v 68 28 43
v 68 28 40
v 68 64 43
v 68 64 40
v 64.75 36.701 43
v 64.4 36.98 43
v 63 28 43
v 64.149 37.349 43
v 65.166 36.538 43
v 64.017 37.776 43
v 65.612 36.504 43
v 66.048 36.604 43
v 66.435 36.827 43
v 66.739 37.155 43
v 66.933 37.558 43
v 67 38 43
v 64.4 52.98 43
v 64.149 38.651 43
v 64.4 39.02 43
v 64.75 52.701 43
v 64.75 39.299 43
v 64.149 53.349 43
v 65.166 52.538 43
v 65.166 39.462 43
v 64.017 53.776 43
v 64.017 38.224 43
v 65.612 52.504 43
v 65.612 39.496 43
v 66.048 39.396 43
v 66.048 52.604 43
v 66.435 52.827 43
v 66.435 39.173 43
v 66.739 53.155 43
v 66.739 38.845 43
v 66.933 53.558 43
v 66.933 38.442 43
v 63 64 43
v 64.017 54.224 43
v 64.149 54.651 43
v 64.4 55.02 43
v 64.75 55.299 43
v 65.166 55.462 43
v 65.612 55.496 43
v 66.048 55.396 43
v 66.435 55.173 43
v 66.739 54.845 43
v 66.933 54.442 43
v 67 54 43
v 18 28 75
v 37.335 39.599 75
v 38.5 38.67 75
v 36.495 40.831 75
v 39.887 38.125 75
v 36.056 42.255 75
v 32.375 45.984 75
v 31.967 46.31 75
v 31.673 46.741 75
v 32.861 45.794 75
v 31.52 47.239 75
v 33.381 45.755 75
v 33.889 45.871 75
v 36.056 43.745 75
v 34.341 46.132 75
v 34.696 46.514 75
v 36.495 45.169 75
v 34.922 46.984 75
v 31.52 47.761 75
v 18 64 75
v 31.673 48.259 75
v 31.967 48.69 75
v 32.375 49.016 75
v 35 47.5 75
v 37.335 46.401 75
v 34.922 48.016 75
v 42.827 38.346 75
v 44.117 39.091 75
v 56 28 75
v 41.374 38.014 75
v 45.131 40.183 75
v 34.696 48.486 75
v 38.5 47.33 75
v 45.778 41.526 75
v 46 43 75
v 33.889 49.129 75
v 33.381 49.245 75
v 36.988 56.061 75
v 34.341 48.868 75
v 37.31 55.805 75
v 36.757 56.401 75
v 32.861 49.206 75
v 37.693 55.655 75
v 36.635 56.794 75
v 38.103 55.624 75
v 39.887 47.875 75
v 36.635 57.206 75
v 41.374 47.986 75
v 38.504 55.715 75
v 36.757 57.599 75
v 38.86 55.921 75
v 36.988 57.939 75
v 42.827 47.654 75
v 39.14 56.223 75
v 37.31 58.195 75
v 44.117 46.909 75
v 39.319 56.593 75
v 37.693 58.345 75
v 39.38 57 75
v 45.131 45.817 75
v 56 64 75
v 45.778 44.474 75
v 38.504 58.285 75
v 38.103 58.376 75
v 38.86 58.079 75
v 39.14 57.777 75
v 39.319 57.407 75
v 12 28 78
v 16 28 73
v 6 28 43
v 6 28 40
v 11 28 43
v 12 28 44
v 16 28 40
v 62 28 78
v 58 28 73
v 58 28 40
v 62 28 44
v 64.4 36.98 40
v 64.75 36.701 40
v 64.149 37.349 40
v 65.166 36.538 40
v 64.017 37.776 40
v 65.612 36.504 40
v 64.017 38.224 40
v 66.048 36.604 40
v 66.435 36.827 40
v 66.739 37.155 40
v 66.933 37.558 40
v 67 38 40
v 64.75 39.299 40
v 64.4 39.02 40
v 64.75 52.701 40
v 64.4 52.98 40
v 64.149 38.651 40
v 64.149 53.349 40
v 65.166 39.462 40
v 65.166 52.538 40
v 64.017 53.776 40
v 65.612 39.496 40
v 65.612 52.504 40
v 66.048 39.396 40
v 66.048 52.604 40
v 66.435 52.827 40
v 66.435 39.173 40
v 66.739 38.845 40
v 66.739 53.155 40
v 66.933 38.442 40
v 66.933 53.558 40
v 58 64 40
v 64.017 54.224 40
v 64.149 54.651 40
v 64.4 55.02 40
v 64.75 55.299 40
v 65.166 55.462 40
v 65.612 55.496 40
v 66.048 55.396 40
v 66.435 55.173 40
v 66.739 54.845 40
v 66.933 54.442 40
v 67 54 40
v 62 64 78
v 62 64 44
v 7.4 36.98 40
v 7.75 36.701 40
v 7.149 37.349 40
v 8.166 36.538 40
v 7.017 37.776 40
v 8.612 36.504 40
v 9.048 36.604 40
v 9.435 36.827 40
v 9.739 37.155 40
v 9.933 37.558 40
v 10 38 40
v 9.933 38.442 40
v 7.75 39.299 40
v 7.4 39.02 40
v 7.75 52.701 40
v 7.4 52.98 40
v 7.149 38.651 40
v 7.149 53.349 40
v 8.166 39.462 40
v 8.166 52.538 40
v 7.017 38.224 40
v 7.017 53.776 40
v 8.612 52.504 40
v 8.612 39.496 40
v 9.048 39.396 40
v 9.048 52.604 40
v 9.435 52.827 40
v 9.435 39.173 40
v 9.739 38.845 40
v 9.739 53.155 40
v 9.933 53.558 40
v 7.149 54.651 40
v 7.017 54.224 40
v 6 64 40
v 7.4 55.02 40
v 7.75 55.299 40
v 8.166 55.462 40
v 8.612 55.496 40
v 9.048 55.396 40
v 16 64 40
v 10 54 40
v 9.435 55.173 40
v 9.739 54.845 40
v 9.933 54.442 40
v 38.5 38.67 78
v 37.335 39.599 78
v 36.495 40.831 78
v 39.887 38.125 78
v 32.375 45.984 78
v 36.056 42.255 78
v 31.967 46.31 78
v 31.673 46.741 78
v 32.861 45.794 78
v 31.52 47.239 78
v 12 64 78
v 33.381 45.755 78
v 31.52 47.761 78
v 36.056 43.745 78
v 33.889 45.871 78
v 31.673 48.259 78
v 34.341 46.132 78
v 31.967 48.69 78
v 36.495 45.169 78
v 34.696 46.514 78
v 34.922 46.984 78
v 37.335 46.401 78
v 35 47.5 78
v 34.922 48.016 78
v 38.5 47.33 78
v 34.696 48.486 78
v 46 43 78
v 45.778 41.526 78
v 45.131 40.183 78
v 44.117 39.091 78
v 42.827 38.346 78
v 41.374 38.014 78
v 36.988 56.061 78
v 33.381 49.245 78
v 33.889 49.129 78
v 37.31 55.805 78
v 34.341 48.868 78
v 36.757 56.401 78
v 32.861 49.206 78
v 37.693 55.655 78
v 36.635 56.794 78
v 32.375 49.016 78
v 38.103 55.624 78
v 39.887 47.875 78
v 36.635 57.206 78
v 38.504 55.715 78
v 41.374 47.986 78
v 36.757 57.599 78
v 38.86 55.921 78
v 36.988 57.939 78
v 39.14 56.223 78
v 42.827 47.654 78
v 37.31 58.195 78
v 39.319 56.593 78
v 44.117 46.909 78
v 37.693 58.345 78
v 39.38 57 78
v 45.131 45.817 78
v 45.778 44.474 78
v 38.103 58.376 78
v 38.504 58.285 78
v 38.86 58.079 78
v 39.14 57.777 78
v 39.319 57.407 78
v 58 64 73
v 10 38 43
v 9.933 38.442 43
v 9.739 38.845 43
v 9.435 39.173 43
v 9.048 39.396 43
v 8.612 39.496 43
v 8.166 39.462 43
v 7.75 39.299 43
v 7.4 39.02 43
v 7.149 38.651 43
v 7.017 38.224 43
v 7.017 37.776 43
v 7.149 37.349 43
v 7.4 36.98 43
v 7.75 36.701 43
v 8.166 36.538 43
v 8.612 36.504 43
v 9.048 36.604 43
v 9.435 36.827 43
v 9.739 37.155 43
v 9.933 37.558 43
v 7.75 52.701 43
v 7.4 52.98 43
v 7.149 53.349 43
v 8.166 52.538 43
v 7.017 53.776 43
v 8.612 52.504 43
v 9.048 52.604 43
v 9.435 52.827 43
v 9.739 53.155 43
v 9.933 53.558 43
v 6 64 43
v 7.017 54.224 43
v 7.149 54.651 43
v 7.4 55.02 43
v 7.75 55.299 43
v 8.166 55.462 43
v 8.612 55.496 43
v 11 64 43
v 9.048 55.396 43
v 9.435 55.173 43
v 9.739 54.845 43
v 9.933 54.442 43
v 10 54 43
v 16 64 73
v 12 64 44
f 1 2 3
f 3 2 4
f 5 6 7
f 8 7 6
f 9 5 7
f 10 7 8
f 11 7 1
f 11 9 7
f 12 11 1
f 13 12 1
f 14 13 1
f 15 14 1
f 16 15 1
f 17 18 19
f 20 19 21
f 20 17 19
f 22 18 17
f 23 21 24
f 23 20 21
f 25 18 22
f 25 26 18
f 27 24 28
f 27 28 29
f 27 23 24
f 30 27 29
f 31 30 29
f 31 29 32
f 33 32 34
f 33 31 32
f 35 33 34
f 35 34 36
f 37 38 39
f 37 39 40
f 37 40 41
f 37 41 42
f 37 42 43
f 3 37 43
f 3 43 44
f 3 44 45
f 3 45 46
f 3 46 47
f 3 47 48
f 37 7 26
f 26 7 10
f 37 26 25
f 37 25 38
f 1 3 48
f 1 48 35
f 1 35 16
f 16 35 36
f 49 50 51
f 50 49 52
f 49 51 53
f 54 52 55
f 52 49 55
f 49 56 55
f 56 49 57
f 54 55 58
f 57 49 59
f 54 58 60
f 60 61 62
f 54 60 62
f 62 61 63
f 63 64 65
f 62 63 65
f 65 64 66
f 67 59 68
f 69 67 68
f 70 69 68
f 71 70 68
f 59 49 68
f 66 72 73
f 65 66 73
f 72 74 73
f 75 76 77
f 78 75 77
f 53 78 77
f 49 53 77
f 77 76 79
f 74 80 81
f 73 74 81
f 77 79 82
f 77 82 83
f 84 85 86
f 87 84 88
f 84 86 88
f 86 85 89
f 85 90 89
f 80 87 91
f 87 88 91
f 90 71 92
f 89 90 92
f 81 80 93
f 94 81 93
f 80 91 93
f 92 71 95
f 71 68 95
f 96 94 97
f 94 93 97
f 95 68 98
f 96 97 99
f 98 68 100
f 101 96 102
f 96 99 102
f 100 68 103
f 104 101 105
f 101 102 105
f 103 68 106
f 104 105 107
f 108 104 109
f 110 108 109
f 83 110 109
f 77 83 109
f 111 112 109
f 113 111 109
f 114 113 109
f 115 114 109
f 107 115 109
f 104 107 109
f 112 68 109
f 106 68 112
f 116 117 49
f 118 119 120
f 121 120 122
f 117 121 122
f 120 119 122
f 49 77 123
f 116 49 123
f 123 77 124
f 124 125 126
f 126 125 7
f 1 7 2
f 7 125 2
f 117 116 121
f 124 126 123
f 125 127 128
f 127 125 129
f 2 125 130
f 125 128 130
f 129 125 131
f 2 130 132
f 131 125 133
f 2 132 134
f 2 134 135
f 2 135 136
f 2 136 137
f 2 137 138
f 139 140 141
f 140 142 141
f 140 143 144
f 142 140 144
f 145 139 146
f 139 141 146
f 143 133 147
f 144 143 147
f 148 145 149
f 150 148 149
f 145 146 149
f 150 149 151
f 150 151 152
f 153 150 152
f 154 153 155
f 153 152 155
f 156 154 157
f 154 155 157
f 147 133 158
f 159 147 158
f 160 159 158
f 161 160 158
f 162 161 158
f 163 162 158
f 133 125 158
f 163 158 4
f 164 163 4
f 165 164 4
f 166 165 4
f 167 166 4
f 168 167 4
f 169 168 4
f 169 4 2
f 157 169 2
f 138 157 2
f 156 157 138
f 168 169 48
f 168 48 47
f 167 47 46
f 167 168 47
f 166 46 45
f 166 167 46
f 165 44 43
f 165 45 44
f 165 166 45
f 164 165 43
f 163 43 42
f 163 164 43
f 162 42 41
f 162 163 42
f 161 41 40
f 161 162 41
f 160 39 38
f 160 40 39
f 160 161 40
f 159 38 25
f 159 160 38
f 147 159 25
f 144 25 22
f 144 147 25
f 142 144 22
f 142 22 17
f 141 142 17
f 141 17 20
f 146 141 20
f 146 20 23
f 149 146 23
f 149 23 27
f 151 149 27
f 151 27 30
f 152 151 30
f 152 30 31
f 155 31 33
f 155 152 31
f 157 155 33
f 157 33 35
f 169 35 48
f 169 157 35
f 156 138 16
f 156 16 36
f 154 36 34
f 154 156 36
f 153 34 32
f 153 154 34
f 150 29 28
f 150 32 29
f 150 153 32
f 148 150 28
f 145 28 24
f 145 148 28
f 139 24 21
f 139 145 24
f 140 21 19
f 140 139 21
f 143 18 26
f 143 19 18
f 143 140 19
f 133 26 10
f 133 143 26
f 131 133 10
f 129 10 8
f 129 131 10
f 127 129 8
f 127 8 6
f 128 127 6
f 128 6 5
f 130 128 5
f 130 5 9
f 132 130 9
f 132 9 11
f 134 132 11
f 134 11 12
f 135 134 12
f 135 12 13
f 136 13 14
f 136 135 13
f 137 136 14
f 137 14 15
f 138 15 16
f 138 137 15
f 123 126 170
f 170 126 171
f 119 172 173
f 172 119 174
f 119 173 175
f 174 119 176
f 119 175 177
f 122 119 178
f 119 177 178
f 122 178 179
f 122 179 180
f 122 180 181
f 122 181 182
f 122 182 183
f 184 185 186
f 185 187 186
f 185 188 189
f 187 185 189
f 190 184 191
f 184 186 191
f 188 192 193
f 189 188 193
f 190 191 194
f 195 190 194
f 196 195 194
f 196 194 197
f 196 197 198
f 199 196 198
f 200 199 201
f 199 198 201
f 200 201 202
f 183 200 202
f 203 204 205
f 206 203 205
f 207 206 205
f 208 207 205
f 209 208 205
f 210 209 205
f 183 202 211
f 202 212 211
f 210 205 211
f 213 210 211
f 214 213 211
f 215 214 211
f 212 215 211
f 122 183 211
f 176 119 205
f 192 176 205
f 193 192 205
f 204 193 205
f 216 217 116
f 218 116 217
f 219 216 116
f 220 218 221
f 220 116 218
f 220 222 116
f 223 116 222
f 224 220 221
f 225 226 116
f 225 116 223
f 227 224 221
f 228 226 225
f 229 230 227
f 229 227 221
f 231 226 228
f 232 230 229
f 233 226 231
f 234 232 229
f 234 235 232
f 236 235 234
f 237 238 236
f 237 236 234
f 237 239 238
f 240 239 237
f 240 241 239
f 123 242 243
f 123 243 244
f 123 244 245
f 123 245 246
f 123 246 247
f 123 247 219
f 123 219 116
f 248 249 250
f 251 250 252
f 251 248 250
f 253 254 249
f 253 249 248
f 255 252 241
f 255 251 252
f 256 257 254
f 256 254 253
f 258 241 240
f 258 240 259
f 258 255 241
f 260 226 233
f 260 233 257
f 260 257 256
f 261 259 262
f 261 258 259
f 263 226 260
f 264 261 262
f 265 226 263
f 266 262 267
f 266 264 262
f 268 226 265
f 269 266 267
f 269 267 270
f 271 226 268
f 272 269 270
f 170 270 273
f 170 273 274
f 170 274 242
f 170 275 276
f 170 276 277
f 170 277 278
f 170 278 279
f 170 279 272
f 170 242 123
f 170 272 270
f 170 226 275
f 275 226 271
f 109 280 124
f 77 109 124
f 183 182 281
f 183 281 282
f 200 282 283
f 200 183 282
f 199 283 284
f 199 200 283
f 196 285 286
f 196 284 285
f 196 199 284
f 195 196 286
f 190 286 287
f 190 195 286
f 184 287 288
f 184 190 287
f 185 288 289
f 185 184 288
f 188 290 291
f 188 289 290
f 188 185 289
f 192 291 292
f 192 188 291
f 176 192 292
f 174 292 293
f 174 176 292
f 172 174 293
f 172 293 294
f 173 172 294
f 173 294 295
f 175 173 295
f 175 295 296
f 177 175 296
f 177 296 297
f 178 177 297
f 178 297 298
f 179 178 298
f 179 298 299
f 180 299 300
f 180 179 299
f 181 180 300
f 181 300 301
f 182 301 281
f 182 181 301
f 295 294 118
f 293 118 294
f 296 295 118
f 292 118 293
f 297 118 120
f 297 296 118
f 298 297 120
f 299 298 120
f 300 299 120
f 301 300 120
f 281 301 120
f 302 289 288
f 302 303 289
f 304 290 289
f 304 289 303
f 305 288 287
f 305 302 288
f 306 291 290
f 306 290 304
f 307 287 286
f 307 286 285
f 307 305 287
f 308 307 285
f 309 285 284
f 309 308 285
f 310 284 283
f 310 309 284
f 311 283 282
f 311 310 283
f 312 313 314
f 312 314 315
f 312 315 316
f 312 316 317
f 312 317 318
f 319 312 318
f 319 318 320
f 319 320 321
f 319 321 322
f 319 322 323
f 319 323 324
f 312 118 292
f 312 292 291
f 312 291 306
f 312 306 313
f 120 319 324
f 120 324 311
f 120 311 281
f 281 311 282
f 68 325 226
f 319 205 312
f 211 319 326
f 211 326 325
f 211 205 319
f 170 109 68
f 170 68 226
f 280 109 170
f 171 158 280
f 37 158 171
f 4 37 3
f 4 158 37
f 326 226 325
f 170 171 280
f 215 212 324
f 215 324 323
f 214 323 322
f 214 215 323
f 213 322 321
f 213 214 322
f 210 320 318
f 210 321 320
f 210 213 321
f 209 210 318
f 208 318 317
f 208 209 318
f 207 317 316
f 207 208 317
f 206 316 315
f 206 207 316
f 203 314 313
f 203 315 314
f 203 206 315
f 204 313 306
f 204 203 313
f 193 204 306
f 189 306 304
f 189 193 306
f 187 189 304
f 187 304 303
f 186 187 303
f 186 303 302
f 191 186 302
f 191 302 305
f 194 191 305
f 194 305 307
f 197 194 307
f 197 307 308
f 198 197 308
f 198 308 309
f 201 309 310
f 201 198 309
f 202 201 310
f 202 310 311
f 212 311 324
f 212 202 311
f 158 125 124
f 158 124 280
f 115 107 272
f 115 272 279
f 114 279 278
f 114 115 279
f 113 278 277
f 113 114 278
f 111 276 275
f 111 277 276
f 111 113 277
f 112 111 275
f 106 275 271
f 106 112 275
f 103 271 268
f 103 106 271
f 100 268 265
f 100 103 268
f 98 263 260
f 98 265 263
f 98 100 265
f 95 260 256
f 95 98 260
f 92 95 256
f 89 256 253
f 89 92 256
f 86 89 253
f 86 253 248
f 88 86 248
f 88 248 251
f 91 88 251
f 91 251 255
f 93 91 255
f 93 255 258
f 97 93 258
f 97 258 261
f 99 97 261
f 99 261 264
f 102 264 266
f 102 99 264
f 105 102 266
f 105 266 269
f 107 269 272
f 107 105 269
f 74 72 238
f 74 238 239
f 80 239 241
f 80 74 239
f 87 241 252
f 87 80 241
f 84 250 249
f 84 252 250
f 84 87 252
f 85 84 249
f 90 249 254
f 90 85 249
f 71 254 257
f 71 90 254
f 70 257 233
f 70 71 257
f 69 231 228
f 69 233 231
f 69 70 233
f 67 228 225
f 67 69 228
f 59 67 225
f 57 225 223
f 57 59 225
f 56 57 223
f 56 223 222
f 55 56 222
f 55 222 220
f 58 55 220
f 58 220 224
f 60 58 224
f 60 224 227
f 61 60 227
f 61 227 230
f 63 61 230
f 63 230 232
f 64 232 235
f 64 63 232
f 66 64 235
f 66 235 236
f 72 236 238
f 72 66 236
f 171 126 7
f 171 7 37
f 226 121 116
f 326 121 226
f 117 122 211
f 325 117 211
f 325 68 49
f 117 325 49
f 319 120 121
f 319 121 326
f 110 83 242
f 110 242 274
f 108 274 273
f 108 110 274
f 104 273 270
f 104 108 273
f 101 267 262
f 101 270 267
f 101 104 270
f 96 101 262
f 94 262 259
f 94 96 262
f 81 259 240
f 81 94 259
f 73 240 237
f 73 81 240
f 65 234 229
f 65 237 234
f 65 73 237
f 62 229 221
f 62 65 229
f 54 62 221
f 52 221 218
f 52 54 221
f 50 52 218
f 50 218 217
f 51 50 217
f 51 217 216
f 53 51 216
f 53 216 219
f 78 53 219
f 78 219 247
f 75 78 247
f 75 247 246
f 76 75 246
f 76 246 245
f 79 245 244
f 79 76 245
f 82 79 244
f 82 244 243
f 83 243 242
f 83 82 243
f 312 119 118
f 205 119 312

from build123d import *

# Parameters (mm, degrees)
CYLINDER049_R             = 1.38
CYLINDER049_DEPTH         = 40
CYLINDER030_R             = 1.75
CYLINDER030_DEPTH         = 10
CYLINDER029_R             = 5
CYLINDER029_DEPTH         = 10
CYLINDER024_R             = 8.5
CYLINDER024_DEPTH         = 2
BOX014_W                  = 0.5
BOX014_H                  = 1
BOX014_DEPTH              = 5
ARRAY002_COUNT            = 12
BOX015_W                  = 0.5
BOX015_H                  = 1
BOX015_DEPTH              = 5
CYLINDER026_R             = 4.5
CYLINDER026_DEPTH         = 8
CYLINDER028_R             = 1.5
CYLINDER028_DEPTH         = 4
BOX016_W                  = 1
BOX016_H                  = 10
BOX016_DEPTH              = 30
CYLINDER027_R             = 3
CYLINDER027_DEPTH         = 30
CYLINDER025_R             = 13
CYLINDER025_DEPTH         = 10
FUSION006_ROLL_ANGLE      = 180
FUSION006_PLACEMENT_ANGLE = 150
CYLINDER023_R             = 1.5
CYLINDER023_DEPTH         = 5
CYLINDER022_R             = 1.5
CYLINDER022_DEPTH         = 5
CYLINDER021_R             = 1.5
CYLINDER021_DEPTH         = 5
CYLINDER020_R             = 1.5
CYLINDER020_DEPTH         = 5
BOX010_W                  = 4
BOX010_H                  = 36
BOX010_DEPTH              = 38
BOX011_W                  = 4
BOX011_H                  = 36
BOX011_DEPTH              = 38
BOX012_W                  = 10
BOX012_H                  = 36
BOX012_DEPTH              = 3
BOX013_W                  = 10
BOX013_H                  = 36
BOX013_DEPTH              = 3
BOX009_W                  = 50
BOX009_H                  = 36
BOX009_DEPTH              = 3
CHAMFER_SIZE              = 2
CHAMFER001_SIZE           = 1


with BuildPart() as cylinder049:
    # Cylinder049 → Cylinder049 (new body)
    with BuildSketch(Plane(origin=(38, 57, 59), x_dir=(1, 0, 0), z_dir=(0, 0, 1))):
        Circle(CYLINDER049_R)
    extrude(amount=CYLINDER049_DEPTH)


with BuildPart() as cylinder030:
    # Cylinder030 → Cylinder030 (new body)
    with BuildSketch(Plane(origin=(33.25, 47.5, 71), x_dir=(1, 0, 0), z_dir=(0, 0, 1))):
        Circle(CYLINDER030_R)
    extrude(amount=CYLINDER030_DEPTH)


with BuildPart() as cylinder029:
    # Cylinder029 → Cylinder029 (new body)
    with BuildSketch(Plane(origin=(41, 43, 71), x_dir=(1, 0, 0), z_dir=(0, 0, 1))):
        Circle(CYLINDER029_R)
    extrude(amount=CYLINDER029_DEPTH)


with BuildPart() as cylinder024:
    # Cylinder024 → Cylinder024 (new body)
    with BuildSketch(Plane.XY.offset(10)):
        Circle(CYLINDER024_R)
    extrude(amount=CYLINDER024_DEPTH)


with BuildPart() as pin_array002:
    # Box014 → Box014 (new body)
    with BuildSketch(Plane(origin=(11, -0.5, -5), x_dir=(1, 0, 0), z_dir=(0, 0, 1))):
        with Locations((0.25, 0.5)):
            Rectangle(BOX014_W, BOX014_H)
    extrude(amount=BOX014_DEPTH)

    # Array002: Pin array002 ×12 about axis
    array002_axis = Axis((0, 0, 0), (0, 0, 1))


with BuildPart() as pin_array002_1:
    add(pin_array002.part)
    for i in range(1, ARRAY002_COUNT):
        add(pin_array002.part.rotate(array002_axis, i * 360 / ARRAY002_COUNT))


with BuildPart() as pin_central002:
    # Box015 → Box015 (new body)
    with BuildSketch(Plane(origin=(3, -0.5, -5), x_dir=(1, 0, 0), z_dir=(0, 0, 1))):
        with Locations((0.25, 0.5)):
            Rectangle(BOX015_W, BOX015_H)
    extrude(amount=BOX015_DEPTH)


with BuildPart() as cylinder026:
    # Cylinder026 → Cylinder026 (new body)
    with BuildSketch(Plane.XY.offset(12)):
        Circle(CYLINDER026_R)
    extrude(amount=CYLINDER026_DEPTH)


with BuildPart() as cylinder028:
    # Cylinder028 → Cylinder028 (new body)
    with BuildSketch(Plane(origin=(9, 0, 10), x_dir=(1, 0, 0), z_dir=(0, 0, 1))):
        Circle(CYLINDER028_R)
    extrude(amount=CYLINDER028_DEPTH)


with BuildPart() as recorte002:
    # Box016 → Box016 (new body)
    with BuildSketch(Plane(origin=(2, -5, 20), x_dir=(1, 0, 0), z_dir=(0, 0, 1))):
        with Locations((0.5, 5)):
            Rectangle(BOX016_W, BOX016_H)
    extrude(amount=BOX016_DEPTH)


with BuildPart() as cuerpo_4_recortado002:
    # Cylinder027 → Cylinder027 (new body)
    with BuildSketch(Plane.XY.offset(20)):
        Circle(CYLINDER027_R)
    extrude(amount=CYLINDER027_DEPTH)

    # Cut010: cut Recorte002
    add(recorte002.part, mode=Mode.SUBTRACT)


with BuildPart() as selector_taladro:
    # Cylinder025 → Cylinder025 (new body)
    with BuildSketch(Plane.XY):
        Circle(CYLINDER025_R)
    extrude(amount=CYLINDER025_DEPTH)

    # Fusion006: union Cylinder024, Pin array002, Pin central002, Cylinder026, Cylinder028, Cuerpo 4 recortado002
    add(cylinder024.part)
    add(pin_array002_1.part)
    add(pin_central002.part)
    add(cylinder026.part)
    add(cylinder028.part)
    add(cuerpo_4_recortado002.part)


with BuildPart() as selector_taladro_1:
    # Fusion006 roll: moved
    add(selector_taladro.part.rotate(Axis((0, 0, 0), (1, 0, 0)), FUSION006_ROLL_ANGLE))


with BuildPart() as selector_taladro_2:
    # Fusion006 placement: moved
    add(selector_taladro_1.part.moved(Location((40.992958, 43.010908, 90))).rotate(Axis((40.992958, 43.010908, 90), (0, 0, 1)), FUSION006_PLACEMENT_ANGLE))


with BuildPart() as cylinder023:
    # Cylinder023 → Cylinder023 (new body)
    with BuildSketch(Plane(origin=(65.5, 54, 39), x_dir=(1, 0, 0), z_dir=(0, 0, 1))):
        Circle(CYLINDER023_R)
    extrude(amount=CYLINDER023_DEPTH)


with BuildPart() as cylinder022:
    # Cylinder022 → Cylinder022 (new body)
    with BuildSketch(Plane(origin=(65.5, 38, 39), x_dir=(1, 0, 0), z_dir=(0, 0, 1))):
        Circle(CYLINDER022_R)
    extrude(amount=CYLINDER022_DEPTH)


with BuildPart() as cylinder021:
    # Cylinder021 → Cylinder021 (new body)
    with BuildSketch(Plane(origin=(8.5, 54, 39), x_dir=(1, 0, 0), z_dir=(0, 0, 1))):
        Circle(CYLINDER021_R)
    extrude(amount=CYLINDER021_DEPTH)


with BuildPart() as cylinder020:
    # Cylinder020 → Cylinder020 (new body)
    with BuildSketch(Plane(origin=(8.5, 38, 39), x_dir=(1, 0, 0), z_dir=(0, 0, 1))):
        Circle(CYLINDER020_R)
    extrude(amount=CYLINDER020_DEPTH)


with BuildPart() as box010:
    # Box010 → Box010 (new body)
    with BuildSketch(Plane(origin=(12, 28, 40), x_dir=(1, 0, 0), z_dir=(0, 0, 1))):
        with Locations((2, 18)):
            Rectangle(BOX010_W, BOX010_H)
    extrude(amount=BOX010_DEPTH)


with BuildPart() as box011:
    # Box011 → Box011 (new body)
    with BuildSketch(Plane(origin=(58, 28, 40), x_dir=(1, 0, 0), z_dir=(0, 0, 1))):
        with Locations((2, 18)):
            Rectangle(BOX011_W, BOX011_H)
    extrude(amount=BOX011_DEPTH)


with BuildPart() as box012:
    # Box012 → Box012 (new body)
    with BuildSketch(Plane(origin=(6, 28, 40), x_dir=(1, 0, 0), z_dir=(0, 0, 1))):
        with Locations((5, 18)):
            Rectangle(BOX012_W, BOX012_H)
    extrude(amount=BOX012_DEPTH)


with BuildPart() as box013:
    # Box013 → Box013 (new body)
    with BuildSketch(Plane(origin=(58, 28, 40), x_dir=(1, 0, 0), z_dir=(0, 0, 1))):
        with Locations((5, 18)):
            Rectangle(BOX013_W, BOX013_H)
    extrude(amount=BOX013_DEPTH)


with BuildPart() as cut028:
    # Box009 → Box009 (new body)
    with BuildSketch(Plane(origin=(12, 28, 75), x_dir=(1, 0, 0), z_dir=(0, 0, 1))):
        with Locations((25, 18)):
            Rectangle(BOX009_W, BOX009_H)
    extrude(amount=BOX009_DEPTH)

    # Fusion005: union Box010, Box011, Box012, Box013
    add(box010.part)
    add(box011.part)
    add(box012.part)
    add(box013.part)

    # Chamfer
    chamfer_edges = [cut028.edges().sort_by_distance(p)[0] for p in [
        (58, 46, 75),
        (16, 46, 75),
    ]]
    chamfer(chamfer_edges, length=CHAMFER_SIZE)

    # Chamfer001
    chamfer001_edges = [cut028.edges().sort_by_distance(p)[0] for p in [
        (62, 46, 43),
        (12, 46, 43),
    ]]
    chamfer(chamfer001_edges, length=CHAMFER001_SIZE)

    # Cut006: cut Cylinder020
    add(cylinder020.part, mode=Mode.SUBTRACT)

    # Cut007: cut Cylinder021
    add(cylinder021.part, mode=Mode.SUBTRACT)

    # Cut008: cut Cylinder022
    add(cylinder022.part, mode=Mode.SUBTRACT)

    # Cut009: cut Cylinder023
    add(cylinder023.part, mode=Mode.SUBTRACT)

    # Cut011: cut Selector taladro
    add(selector_taladro_2.part, mode=Mode.SUBTRACT)

    # Cut012: cut Cylinder029
    add(cylinder029.part, mode=Mode.SUBTRACT)

    # Cut013: cut Cylinder030
    add(cylinder030.part, mode=Mode.SUBTRACT)

    # Cut028: cut Cylinder049
    add(cylinder049.part, mode=Mode.SUBTRACT)


solid = cut028.part
